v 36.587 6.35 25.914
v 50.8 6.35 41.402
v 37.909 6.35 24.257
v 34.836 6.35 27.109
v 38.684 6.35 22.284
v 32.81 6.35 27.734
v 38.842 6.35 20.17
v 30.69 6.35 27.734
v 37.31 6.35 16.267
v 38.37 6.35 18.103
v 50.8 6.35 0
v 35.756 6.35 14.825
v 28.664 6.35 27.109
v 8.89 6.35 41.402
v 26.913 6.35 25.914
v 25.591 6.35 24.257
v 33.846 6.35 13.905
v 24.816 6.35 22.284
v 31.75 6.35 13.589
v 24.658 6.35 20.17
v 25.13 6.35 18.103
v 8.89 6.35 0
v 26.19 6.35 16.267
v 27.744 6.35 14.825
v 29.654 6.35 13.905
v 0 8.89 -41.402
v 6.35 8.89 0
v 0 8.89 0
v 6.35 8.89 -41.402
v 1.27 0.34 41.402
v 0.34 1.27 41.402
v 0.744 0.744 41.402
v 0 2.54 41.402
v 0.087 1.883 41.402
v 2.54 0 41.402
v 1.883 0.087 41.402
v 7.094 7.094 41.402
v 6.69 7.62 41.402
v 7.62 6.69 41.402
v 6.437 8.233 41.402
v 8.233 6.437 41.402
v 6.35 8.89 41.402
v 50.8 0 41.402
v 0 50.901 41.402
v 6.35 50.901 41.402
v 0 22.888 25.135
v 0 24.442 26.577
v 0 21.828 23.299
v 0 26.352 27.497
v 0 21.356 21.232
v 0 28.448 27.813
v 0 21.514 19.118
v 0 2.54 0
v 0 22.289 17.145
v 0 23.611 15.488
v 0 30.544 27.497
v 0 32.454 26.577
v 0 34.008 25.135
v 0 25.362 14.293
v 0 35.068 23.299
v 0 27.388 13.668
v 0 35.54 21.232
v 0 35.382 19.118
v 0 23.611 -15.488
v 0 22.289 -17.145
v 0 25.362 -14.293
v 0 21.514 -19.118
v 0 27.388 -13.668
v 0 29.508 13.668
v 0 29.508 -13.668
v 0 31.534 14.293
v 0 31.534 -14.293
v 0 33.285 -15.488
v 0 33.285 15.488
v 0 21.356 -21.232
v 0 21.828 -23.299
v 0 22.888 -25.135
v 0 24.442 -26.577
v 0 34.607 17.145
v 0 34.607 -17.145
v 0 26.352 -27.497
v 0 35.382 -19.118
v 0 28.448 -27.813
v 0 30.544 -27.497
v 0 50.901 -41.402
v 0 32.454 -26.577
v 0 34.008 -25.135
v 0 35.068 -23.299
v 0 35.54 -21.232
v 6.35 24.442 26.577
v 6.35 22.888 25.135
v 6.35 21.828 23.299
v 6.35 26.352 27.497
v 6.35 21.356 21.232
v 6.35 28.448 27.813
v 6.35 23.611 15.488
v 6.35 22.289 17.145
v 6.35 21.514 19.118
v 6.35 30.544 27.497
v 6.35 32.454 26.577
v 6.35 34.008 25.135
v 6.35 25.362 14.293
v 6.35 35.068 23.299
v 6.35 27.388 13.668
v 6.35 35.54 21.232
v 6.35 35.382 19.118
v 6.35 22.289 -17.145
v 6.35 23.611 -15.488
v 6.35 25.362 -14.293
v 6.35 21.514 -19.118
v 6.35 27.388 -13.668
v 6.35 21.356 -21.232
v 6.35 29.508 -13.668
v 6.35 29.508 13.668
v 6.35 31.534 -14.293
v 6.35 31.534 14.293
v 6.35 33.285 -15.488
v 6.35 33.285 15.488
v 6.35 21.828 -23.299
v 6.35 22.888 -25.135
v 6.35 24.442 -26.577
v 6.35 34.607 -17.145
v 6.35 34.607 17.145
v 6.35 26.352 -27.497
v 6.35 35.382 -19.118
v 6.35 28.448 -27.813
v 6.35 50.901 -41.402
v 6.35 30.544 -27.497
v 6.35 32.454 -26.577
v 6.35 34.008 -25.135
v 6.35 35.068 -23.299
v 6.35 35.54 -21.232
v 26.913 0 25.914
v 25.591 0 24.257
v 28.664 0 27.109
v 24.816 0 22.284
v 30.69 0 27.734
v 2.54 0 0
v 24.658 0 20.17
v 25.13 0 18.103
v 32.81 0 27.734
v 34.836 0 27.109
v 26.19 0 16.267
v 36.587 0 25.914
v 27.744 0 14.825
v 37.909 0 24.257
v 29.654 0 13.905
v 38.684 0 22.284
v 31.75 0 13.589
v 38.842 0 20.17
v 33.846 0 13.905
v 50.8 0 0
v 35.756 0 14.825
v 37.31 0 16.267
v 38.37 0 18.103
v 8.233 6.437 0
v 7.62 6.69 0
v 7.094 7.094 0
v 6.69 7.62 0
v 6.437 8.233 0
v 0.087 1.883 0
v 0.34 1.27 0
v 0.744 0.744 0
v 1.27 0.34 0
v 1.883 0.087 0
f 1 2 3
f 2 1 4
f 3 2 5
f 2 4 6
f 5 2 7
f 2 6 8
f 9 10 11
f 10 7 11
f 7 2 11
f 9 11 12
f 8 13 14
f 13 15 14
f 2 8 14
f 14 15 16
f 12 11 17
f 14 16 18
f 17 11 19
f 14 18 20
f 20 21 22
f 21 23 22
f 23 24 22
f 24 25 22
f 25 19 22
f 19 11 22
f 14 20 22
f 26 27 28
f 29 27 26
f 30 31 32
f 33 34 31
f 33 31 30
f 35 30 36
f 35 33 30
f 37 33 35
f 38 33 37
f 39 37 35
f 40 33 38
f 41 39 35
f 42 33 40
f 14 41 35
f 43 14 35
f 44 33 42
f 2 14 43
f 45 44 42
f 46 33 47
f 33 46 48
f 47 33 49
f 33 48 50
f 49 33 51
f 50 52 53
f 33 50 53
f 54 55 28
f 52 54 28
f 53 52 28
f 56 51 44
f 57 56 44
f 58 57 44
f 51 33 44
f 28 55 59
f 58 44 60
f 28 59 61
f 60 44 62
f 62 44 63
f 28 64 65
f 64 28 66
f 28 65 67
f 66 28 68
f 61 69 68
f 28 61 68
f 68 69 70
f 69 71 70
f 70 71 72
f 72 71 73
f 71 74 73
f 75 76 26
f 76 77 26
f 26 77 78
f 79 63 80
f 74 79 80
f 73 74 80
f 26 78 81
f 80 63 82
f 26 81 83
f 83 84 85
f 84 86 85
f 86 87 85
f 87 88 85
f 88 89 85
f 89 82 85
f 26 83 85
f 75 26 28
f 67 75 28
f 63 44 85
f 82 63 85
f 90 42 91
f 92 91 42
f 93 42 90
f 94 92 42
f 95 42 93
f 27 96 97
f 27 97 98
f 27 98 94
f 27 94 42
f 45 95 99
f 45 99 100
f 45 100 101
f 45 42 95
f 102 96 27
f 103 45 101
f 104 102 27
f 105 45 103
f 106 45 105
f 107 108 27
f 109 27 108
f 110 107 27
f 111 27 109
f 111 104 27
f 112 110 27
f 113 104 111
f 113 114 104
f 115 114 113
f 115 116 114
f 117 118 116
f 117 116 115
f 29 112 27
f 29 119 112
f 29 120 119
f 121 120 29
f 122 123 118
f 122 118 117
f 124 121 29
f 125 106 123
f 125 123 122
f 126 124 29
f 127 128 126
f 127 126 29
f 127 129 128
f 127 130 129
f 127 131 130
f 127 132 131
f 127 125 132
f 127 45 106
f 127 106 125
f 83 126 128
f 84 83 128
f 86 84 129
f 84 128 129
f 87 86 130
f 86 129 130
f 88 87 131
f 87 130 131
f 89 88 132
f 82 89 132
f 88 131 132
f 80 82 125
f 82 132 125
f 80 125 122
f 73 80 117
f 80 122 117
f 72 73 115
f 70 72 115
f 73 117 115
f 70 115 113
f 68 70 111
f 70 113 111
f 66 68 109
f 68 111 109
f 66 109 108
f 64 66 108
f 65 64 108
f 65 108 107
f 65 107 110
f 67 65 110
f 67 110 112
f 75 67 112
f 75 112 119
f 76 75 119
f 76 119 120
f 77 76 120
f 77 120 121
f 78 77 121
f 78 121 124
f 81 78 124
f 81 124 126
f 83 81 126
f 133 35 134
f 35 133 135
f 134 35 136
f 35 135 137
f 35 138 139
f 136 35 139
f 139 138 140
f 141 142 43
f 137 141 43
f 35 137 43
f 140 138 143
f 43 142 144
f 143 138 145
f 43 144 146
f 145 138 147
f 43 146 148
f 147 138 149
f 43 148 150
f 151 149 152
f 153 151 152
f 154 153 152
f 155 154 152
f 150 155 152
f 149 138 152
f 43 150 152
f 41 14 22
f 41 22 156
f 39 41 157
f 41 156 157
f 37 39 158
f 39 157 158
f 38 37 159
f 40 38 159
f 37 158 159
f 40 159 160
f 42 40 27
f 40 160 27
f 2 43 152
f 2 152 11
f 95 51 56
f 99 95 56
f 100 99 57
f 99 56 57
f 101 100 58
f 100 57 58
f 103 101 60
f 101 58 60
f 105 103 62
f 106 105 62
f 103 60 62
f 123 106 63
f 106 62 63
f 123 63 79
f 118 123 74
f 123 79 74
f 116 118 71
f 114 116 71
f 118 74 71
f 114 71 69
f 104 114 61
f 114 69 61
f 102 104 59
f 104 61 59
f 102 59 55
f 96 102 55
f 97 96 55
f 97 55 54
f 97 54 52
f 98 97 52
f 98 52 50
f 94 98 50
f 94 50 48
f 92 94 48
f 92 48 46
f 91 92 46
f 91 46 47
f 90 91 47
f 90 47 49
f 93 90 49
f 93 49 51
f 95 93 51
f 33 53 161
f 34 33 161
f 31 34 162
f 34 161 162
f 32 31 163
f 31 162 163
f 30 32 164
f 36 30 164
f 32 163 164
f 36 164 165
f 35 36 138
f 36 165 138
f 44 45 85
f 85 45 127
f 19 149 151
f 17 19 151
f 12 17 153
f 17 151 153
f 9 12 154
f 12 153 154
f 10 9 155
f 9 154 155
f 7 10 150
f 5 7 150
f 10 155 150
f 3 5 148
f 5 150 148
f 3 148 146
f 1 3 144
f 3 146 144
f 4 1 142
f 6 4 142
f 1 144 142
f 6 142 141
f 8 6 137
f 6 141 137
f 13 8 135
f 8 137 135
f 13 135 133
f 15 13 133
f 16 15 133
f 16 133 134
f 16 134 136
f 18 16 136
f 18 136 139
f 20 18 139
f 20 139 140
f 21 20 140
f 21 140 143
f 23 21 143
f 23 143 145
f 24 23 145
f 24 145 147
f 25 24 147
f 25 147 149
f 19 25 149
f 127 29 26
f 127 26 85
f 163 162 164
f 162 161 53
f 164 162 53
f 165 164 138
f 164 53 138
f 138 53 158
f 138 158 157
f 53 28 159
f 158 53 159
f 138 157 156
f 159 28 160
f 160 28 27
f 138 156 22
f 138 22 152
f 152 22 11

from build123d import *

# Parameters (mm, degrees)
EXTRUDE_1_DEPTH     = 41.402
SKETCH_4_R          = 7.112
CUT_EXTRUDE_1_DEPTH = 83.979969858
SKETCH_3_R          = 7.112
CUT_EXTRUDE_2_DEPTH = 83.979969858
SKETCH1_W           = 41.402
SKETCH1_H           = 42.010980282
BOSS_EXTRUDE1_DEPTH = 6.35
SKETCH2_R           = 7.112
CUT_EXTRUDE1_DEPTH  = 80.251737506


with BuildPart() as part:
    # 草图1 → 凸台-拉伸1 (new body)
    with BuildSketch(Plane.XY):
        with BuildLine():
            Line((2.54, 0), (50.8, 0))
            Line((50.8, 0), (50.8, 6.35))
            Line((50.8, 6.35), (8.89, 6.35))
            ThreePointArc((8.89, 6.35), (7.093948776, 7.093948776), (6.35, 8.89))
            Line((6.35, 8.89), (6.35, 50.900980282))
            Line((6.35, 50.900980282), (0, 50.900980282))
            Line((0, 50.900980282), (0, 2.54))
            ThreePointArc((0, 2.54), (0.743948776, 0.743948776), (2.54, 0))
        make_face()
    extrude(amount=EXTRUDE_1_DEPTH)

    # 草图4 → 切除-拉伸1 (cut, through all)
    with BuildSketch(Plane.ZY):
        with Locations((20.701, 28.448)):
            Circle(SKETCH_4_R)
    extrude(amount=-CUT_EXTRUDE_1_DEPTH, mode=Mode.SUBTRACT)

    # 草图3 → 切除-拉伸2 (cut, through all)
    with BuildSketch(Plane(origin=(0, 0, 0), x_dir=(-1, 0, 0), z_dir=(0, -1, 0))):
        with Locations(Location((-31.75, -20.701, 0), (0, 0, 90))):
            Circle(SKETCH_3_R)
    extrude(amount=-CUT_EXTRUDE_2_DEPTH, mode=Mode.SUBTRACT)

    # Sketch1 → Boss-Extrude1 (add)
    with BuildSketch(Plane(origin=(6.35, 0, 0), x_dir=(0, 0, -1), z_dir=(1, 0, 0))):
        with Locations((20.701, 29.895490141)):
            Rectangle(SKETCH1_W, SKETCH1_H)
    extrude(amount=-BOSS_EXTRUDE1_DEPTH)

    # Sketch2 → Cut-Extrude1 (cut, through all)
    with BuildSketch(Plane(origin=(6.35, 0, 0), x_dir=(0, 0, -1), z_dir=(1, 0, 0))):
        with Locations(Location((-20.701, 28.448, 0), (0, 0, 180))):
            Circle(SKETCH2_R)
        with Locations((20.701, 28.448)):
            Circle(SKETCH2_R)
    extrude(amount=-CUT_EXTRUDE1_DEPTH, mode=Mode.SUBTRACT)


solid = part.part
